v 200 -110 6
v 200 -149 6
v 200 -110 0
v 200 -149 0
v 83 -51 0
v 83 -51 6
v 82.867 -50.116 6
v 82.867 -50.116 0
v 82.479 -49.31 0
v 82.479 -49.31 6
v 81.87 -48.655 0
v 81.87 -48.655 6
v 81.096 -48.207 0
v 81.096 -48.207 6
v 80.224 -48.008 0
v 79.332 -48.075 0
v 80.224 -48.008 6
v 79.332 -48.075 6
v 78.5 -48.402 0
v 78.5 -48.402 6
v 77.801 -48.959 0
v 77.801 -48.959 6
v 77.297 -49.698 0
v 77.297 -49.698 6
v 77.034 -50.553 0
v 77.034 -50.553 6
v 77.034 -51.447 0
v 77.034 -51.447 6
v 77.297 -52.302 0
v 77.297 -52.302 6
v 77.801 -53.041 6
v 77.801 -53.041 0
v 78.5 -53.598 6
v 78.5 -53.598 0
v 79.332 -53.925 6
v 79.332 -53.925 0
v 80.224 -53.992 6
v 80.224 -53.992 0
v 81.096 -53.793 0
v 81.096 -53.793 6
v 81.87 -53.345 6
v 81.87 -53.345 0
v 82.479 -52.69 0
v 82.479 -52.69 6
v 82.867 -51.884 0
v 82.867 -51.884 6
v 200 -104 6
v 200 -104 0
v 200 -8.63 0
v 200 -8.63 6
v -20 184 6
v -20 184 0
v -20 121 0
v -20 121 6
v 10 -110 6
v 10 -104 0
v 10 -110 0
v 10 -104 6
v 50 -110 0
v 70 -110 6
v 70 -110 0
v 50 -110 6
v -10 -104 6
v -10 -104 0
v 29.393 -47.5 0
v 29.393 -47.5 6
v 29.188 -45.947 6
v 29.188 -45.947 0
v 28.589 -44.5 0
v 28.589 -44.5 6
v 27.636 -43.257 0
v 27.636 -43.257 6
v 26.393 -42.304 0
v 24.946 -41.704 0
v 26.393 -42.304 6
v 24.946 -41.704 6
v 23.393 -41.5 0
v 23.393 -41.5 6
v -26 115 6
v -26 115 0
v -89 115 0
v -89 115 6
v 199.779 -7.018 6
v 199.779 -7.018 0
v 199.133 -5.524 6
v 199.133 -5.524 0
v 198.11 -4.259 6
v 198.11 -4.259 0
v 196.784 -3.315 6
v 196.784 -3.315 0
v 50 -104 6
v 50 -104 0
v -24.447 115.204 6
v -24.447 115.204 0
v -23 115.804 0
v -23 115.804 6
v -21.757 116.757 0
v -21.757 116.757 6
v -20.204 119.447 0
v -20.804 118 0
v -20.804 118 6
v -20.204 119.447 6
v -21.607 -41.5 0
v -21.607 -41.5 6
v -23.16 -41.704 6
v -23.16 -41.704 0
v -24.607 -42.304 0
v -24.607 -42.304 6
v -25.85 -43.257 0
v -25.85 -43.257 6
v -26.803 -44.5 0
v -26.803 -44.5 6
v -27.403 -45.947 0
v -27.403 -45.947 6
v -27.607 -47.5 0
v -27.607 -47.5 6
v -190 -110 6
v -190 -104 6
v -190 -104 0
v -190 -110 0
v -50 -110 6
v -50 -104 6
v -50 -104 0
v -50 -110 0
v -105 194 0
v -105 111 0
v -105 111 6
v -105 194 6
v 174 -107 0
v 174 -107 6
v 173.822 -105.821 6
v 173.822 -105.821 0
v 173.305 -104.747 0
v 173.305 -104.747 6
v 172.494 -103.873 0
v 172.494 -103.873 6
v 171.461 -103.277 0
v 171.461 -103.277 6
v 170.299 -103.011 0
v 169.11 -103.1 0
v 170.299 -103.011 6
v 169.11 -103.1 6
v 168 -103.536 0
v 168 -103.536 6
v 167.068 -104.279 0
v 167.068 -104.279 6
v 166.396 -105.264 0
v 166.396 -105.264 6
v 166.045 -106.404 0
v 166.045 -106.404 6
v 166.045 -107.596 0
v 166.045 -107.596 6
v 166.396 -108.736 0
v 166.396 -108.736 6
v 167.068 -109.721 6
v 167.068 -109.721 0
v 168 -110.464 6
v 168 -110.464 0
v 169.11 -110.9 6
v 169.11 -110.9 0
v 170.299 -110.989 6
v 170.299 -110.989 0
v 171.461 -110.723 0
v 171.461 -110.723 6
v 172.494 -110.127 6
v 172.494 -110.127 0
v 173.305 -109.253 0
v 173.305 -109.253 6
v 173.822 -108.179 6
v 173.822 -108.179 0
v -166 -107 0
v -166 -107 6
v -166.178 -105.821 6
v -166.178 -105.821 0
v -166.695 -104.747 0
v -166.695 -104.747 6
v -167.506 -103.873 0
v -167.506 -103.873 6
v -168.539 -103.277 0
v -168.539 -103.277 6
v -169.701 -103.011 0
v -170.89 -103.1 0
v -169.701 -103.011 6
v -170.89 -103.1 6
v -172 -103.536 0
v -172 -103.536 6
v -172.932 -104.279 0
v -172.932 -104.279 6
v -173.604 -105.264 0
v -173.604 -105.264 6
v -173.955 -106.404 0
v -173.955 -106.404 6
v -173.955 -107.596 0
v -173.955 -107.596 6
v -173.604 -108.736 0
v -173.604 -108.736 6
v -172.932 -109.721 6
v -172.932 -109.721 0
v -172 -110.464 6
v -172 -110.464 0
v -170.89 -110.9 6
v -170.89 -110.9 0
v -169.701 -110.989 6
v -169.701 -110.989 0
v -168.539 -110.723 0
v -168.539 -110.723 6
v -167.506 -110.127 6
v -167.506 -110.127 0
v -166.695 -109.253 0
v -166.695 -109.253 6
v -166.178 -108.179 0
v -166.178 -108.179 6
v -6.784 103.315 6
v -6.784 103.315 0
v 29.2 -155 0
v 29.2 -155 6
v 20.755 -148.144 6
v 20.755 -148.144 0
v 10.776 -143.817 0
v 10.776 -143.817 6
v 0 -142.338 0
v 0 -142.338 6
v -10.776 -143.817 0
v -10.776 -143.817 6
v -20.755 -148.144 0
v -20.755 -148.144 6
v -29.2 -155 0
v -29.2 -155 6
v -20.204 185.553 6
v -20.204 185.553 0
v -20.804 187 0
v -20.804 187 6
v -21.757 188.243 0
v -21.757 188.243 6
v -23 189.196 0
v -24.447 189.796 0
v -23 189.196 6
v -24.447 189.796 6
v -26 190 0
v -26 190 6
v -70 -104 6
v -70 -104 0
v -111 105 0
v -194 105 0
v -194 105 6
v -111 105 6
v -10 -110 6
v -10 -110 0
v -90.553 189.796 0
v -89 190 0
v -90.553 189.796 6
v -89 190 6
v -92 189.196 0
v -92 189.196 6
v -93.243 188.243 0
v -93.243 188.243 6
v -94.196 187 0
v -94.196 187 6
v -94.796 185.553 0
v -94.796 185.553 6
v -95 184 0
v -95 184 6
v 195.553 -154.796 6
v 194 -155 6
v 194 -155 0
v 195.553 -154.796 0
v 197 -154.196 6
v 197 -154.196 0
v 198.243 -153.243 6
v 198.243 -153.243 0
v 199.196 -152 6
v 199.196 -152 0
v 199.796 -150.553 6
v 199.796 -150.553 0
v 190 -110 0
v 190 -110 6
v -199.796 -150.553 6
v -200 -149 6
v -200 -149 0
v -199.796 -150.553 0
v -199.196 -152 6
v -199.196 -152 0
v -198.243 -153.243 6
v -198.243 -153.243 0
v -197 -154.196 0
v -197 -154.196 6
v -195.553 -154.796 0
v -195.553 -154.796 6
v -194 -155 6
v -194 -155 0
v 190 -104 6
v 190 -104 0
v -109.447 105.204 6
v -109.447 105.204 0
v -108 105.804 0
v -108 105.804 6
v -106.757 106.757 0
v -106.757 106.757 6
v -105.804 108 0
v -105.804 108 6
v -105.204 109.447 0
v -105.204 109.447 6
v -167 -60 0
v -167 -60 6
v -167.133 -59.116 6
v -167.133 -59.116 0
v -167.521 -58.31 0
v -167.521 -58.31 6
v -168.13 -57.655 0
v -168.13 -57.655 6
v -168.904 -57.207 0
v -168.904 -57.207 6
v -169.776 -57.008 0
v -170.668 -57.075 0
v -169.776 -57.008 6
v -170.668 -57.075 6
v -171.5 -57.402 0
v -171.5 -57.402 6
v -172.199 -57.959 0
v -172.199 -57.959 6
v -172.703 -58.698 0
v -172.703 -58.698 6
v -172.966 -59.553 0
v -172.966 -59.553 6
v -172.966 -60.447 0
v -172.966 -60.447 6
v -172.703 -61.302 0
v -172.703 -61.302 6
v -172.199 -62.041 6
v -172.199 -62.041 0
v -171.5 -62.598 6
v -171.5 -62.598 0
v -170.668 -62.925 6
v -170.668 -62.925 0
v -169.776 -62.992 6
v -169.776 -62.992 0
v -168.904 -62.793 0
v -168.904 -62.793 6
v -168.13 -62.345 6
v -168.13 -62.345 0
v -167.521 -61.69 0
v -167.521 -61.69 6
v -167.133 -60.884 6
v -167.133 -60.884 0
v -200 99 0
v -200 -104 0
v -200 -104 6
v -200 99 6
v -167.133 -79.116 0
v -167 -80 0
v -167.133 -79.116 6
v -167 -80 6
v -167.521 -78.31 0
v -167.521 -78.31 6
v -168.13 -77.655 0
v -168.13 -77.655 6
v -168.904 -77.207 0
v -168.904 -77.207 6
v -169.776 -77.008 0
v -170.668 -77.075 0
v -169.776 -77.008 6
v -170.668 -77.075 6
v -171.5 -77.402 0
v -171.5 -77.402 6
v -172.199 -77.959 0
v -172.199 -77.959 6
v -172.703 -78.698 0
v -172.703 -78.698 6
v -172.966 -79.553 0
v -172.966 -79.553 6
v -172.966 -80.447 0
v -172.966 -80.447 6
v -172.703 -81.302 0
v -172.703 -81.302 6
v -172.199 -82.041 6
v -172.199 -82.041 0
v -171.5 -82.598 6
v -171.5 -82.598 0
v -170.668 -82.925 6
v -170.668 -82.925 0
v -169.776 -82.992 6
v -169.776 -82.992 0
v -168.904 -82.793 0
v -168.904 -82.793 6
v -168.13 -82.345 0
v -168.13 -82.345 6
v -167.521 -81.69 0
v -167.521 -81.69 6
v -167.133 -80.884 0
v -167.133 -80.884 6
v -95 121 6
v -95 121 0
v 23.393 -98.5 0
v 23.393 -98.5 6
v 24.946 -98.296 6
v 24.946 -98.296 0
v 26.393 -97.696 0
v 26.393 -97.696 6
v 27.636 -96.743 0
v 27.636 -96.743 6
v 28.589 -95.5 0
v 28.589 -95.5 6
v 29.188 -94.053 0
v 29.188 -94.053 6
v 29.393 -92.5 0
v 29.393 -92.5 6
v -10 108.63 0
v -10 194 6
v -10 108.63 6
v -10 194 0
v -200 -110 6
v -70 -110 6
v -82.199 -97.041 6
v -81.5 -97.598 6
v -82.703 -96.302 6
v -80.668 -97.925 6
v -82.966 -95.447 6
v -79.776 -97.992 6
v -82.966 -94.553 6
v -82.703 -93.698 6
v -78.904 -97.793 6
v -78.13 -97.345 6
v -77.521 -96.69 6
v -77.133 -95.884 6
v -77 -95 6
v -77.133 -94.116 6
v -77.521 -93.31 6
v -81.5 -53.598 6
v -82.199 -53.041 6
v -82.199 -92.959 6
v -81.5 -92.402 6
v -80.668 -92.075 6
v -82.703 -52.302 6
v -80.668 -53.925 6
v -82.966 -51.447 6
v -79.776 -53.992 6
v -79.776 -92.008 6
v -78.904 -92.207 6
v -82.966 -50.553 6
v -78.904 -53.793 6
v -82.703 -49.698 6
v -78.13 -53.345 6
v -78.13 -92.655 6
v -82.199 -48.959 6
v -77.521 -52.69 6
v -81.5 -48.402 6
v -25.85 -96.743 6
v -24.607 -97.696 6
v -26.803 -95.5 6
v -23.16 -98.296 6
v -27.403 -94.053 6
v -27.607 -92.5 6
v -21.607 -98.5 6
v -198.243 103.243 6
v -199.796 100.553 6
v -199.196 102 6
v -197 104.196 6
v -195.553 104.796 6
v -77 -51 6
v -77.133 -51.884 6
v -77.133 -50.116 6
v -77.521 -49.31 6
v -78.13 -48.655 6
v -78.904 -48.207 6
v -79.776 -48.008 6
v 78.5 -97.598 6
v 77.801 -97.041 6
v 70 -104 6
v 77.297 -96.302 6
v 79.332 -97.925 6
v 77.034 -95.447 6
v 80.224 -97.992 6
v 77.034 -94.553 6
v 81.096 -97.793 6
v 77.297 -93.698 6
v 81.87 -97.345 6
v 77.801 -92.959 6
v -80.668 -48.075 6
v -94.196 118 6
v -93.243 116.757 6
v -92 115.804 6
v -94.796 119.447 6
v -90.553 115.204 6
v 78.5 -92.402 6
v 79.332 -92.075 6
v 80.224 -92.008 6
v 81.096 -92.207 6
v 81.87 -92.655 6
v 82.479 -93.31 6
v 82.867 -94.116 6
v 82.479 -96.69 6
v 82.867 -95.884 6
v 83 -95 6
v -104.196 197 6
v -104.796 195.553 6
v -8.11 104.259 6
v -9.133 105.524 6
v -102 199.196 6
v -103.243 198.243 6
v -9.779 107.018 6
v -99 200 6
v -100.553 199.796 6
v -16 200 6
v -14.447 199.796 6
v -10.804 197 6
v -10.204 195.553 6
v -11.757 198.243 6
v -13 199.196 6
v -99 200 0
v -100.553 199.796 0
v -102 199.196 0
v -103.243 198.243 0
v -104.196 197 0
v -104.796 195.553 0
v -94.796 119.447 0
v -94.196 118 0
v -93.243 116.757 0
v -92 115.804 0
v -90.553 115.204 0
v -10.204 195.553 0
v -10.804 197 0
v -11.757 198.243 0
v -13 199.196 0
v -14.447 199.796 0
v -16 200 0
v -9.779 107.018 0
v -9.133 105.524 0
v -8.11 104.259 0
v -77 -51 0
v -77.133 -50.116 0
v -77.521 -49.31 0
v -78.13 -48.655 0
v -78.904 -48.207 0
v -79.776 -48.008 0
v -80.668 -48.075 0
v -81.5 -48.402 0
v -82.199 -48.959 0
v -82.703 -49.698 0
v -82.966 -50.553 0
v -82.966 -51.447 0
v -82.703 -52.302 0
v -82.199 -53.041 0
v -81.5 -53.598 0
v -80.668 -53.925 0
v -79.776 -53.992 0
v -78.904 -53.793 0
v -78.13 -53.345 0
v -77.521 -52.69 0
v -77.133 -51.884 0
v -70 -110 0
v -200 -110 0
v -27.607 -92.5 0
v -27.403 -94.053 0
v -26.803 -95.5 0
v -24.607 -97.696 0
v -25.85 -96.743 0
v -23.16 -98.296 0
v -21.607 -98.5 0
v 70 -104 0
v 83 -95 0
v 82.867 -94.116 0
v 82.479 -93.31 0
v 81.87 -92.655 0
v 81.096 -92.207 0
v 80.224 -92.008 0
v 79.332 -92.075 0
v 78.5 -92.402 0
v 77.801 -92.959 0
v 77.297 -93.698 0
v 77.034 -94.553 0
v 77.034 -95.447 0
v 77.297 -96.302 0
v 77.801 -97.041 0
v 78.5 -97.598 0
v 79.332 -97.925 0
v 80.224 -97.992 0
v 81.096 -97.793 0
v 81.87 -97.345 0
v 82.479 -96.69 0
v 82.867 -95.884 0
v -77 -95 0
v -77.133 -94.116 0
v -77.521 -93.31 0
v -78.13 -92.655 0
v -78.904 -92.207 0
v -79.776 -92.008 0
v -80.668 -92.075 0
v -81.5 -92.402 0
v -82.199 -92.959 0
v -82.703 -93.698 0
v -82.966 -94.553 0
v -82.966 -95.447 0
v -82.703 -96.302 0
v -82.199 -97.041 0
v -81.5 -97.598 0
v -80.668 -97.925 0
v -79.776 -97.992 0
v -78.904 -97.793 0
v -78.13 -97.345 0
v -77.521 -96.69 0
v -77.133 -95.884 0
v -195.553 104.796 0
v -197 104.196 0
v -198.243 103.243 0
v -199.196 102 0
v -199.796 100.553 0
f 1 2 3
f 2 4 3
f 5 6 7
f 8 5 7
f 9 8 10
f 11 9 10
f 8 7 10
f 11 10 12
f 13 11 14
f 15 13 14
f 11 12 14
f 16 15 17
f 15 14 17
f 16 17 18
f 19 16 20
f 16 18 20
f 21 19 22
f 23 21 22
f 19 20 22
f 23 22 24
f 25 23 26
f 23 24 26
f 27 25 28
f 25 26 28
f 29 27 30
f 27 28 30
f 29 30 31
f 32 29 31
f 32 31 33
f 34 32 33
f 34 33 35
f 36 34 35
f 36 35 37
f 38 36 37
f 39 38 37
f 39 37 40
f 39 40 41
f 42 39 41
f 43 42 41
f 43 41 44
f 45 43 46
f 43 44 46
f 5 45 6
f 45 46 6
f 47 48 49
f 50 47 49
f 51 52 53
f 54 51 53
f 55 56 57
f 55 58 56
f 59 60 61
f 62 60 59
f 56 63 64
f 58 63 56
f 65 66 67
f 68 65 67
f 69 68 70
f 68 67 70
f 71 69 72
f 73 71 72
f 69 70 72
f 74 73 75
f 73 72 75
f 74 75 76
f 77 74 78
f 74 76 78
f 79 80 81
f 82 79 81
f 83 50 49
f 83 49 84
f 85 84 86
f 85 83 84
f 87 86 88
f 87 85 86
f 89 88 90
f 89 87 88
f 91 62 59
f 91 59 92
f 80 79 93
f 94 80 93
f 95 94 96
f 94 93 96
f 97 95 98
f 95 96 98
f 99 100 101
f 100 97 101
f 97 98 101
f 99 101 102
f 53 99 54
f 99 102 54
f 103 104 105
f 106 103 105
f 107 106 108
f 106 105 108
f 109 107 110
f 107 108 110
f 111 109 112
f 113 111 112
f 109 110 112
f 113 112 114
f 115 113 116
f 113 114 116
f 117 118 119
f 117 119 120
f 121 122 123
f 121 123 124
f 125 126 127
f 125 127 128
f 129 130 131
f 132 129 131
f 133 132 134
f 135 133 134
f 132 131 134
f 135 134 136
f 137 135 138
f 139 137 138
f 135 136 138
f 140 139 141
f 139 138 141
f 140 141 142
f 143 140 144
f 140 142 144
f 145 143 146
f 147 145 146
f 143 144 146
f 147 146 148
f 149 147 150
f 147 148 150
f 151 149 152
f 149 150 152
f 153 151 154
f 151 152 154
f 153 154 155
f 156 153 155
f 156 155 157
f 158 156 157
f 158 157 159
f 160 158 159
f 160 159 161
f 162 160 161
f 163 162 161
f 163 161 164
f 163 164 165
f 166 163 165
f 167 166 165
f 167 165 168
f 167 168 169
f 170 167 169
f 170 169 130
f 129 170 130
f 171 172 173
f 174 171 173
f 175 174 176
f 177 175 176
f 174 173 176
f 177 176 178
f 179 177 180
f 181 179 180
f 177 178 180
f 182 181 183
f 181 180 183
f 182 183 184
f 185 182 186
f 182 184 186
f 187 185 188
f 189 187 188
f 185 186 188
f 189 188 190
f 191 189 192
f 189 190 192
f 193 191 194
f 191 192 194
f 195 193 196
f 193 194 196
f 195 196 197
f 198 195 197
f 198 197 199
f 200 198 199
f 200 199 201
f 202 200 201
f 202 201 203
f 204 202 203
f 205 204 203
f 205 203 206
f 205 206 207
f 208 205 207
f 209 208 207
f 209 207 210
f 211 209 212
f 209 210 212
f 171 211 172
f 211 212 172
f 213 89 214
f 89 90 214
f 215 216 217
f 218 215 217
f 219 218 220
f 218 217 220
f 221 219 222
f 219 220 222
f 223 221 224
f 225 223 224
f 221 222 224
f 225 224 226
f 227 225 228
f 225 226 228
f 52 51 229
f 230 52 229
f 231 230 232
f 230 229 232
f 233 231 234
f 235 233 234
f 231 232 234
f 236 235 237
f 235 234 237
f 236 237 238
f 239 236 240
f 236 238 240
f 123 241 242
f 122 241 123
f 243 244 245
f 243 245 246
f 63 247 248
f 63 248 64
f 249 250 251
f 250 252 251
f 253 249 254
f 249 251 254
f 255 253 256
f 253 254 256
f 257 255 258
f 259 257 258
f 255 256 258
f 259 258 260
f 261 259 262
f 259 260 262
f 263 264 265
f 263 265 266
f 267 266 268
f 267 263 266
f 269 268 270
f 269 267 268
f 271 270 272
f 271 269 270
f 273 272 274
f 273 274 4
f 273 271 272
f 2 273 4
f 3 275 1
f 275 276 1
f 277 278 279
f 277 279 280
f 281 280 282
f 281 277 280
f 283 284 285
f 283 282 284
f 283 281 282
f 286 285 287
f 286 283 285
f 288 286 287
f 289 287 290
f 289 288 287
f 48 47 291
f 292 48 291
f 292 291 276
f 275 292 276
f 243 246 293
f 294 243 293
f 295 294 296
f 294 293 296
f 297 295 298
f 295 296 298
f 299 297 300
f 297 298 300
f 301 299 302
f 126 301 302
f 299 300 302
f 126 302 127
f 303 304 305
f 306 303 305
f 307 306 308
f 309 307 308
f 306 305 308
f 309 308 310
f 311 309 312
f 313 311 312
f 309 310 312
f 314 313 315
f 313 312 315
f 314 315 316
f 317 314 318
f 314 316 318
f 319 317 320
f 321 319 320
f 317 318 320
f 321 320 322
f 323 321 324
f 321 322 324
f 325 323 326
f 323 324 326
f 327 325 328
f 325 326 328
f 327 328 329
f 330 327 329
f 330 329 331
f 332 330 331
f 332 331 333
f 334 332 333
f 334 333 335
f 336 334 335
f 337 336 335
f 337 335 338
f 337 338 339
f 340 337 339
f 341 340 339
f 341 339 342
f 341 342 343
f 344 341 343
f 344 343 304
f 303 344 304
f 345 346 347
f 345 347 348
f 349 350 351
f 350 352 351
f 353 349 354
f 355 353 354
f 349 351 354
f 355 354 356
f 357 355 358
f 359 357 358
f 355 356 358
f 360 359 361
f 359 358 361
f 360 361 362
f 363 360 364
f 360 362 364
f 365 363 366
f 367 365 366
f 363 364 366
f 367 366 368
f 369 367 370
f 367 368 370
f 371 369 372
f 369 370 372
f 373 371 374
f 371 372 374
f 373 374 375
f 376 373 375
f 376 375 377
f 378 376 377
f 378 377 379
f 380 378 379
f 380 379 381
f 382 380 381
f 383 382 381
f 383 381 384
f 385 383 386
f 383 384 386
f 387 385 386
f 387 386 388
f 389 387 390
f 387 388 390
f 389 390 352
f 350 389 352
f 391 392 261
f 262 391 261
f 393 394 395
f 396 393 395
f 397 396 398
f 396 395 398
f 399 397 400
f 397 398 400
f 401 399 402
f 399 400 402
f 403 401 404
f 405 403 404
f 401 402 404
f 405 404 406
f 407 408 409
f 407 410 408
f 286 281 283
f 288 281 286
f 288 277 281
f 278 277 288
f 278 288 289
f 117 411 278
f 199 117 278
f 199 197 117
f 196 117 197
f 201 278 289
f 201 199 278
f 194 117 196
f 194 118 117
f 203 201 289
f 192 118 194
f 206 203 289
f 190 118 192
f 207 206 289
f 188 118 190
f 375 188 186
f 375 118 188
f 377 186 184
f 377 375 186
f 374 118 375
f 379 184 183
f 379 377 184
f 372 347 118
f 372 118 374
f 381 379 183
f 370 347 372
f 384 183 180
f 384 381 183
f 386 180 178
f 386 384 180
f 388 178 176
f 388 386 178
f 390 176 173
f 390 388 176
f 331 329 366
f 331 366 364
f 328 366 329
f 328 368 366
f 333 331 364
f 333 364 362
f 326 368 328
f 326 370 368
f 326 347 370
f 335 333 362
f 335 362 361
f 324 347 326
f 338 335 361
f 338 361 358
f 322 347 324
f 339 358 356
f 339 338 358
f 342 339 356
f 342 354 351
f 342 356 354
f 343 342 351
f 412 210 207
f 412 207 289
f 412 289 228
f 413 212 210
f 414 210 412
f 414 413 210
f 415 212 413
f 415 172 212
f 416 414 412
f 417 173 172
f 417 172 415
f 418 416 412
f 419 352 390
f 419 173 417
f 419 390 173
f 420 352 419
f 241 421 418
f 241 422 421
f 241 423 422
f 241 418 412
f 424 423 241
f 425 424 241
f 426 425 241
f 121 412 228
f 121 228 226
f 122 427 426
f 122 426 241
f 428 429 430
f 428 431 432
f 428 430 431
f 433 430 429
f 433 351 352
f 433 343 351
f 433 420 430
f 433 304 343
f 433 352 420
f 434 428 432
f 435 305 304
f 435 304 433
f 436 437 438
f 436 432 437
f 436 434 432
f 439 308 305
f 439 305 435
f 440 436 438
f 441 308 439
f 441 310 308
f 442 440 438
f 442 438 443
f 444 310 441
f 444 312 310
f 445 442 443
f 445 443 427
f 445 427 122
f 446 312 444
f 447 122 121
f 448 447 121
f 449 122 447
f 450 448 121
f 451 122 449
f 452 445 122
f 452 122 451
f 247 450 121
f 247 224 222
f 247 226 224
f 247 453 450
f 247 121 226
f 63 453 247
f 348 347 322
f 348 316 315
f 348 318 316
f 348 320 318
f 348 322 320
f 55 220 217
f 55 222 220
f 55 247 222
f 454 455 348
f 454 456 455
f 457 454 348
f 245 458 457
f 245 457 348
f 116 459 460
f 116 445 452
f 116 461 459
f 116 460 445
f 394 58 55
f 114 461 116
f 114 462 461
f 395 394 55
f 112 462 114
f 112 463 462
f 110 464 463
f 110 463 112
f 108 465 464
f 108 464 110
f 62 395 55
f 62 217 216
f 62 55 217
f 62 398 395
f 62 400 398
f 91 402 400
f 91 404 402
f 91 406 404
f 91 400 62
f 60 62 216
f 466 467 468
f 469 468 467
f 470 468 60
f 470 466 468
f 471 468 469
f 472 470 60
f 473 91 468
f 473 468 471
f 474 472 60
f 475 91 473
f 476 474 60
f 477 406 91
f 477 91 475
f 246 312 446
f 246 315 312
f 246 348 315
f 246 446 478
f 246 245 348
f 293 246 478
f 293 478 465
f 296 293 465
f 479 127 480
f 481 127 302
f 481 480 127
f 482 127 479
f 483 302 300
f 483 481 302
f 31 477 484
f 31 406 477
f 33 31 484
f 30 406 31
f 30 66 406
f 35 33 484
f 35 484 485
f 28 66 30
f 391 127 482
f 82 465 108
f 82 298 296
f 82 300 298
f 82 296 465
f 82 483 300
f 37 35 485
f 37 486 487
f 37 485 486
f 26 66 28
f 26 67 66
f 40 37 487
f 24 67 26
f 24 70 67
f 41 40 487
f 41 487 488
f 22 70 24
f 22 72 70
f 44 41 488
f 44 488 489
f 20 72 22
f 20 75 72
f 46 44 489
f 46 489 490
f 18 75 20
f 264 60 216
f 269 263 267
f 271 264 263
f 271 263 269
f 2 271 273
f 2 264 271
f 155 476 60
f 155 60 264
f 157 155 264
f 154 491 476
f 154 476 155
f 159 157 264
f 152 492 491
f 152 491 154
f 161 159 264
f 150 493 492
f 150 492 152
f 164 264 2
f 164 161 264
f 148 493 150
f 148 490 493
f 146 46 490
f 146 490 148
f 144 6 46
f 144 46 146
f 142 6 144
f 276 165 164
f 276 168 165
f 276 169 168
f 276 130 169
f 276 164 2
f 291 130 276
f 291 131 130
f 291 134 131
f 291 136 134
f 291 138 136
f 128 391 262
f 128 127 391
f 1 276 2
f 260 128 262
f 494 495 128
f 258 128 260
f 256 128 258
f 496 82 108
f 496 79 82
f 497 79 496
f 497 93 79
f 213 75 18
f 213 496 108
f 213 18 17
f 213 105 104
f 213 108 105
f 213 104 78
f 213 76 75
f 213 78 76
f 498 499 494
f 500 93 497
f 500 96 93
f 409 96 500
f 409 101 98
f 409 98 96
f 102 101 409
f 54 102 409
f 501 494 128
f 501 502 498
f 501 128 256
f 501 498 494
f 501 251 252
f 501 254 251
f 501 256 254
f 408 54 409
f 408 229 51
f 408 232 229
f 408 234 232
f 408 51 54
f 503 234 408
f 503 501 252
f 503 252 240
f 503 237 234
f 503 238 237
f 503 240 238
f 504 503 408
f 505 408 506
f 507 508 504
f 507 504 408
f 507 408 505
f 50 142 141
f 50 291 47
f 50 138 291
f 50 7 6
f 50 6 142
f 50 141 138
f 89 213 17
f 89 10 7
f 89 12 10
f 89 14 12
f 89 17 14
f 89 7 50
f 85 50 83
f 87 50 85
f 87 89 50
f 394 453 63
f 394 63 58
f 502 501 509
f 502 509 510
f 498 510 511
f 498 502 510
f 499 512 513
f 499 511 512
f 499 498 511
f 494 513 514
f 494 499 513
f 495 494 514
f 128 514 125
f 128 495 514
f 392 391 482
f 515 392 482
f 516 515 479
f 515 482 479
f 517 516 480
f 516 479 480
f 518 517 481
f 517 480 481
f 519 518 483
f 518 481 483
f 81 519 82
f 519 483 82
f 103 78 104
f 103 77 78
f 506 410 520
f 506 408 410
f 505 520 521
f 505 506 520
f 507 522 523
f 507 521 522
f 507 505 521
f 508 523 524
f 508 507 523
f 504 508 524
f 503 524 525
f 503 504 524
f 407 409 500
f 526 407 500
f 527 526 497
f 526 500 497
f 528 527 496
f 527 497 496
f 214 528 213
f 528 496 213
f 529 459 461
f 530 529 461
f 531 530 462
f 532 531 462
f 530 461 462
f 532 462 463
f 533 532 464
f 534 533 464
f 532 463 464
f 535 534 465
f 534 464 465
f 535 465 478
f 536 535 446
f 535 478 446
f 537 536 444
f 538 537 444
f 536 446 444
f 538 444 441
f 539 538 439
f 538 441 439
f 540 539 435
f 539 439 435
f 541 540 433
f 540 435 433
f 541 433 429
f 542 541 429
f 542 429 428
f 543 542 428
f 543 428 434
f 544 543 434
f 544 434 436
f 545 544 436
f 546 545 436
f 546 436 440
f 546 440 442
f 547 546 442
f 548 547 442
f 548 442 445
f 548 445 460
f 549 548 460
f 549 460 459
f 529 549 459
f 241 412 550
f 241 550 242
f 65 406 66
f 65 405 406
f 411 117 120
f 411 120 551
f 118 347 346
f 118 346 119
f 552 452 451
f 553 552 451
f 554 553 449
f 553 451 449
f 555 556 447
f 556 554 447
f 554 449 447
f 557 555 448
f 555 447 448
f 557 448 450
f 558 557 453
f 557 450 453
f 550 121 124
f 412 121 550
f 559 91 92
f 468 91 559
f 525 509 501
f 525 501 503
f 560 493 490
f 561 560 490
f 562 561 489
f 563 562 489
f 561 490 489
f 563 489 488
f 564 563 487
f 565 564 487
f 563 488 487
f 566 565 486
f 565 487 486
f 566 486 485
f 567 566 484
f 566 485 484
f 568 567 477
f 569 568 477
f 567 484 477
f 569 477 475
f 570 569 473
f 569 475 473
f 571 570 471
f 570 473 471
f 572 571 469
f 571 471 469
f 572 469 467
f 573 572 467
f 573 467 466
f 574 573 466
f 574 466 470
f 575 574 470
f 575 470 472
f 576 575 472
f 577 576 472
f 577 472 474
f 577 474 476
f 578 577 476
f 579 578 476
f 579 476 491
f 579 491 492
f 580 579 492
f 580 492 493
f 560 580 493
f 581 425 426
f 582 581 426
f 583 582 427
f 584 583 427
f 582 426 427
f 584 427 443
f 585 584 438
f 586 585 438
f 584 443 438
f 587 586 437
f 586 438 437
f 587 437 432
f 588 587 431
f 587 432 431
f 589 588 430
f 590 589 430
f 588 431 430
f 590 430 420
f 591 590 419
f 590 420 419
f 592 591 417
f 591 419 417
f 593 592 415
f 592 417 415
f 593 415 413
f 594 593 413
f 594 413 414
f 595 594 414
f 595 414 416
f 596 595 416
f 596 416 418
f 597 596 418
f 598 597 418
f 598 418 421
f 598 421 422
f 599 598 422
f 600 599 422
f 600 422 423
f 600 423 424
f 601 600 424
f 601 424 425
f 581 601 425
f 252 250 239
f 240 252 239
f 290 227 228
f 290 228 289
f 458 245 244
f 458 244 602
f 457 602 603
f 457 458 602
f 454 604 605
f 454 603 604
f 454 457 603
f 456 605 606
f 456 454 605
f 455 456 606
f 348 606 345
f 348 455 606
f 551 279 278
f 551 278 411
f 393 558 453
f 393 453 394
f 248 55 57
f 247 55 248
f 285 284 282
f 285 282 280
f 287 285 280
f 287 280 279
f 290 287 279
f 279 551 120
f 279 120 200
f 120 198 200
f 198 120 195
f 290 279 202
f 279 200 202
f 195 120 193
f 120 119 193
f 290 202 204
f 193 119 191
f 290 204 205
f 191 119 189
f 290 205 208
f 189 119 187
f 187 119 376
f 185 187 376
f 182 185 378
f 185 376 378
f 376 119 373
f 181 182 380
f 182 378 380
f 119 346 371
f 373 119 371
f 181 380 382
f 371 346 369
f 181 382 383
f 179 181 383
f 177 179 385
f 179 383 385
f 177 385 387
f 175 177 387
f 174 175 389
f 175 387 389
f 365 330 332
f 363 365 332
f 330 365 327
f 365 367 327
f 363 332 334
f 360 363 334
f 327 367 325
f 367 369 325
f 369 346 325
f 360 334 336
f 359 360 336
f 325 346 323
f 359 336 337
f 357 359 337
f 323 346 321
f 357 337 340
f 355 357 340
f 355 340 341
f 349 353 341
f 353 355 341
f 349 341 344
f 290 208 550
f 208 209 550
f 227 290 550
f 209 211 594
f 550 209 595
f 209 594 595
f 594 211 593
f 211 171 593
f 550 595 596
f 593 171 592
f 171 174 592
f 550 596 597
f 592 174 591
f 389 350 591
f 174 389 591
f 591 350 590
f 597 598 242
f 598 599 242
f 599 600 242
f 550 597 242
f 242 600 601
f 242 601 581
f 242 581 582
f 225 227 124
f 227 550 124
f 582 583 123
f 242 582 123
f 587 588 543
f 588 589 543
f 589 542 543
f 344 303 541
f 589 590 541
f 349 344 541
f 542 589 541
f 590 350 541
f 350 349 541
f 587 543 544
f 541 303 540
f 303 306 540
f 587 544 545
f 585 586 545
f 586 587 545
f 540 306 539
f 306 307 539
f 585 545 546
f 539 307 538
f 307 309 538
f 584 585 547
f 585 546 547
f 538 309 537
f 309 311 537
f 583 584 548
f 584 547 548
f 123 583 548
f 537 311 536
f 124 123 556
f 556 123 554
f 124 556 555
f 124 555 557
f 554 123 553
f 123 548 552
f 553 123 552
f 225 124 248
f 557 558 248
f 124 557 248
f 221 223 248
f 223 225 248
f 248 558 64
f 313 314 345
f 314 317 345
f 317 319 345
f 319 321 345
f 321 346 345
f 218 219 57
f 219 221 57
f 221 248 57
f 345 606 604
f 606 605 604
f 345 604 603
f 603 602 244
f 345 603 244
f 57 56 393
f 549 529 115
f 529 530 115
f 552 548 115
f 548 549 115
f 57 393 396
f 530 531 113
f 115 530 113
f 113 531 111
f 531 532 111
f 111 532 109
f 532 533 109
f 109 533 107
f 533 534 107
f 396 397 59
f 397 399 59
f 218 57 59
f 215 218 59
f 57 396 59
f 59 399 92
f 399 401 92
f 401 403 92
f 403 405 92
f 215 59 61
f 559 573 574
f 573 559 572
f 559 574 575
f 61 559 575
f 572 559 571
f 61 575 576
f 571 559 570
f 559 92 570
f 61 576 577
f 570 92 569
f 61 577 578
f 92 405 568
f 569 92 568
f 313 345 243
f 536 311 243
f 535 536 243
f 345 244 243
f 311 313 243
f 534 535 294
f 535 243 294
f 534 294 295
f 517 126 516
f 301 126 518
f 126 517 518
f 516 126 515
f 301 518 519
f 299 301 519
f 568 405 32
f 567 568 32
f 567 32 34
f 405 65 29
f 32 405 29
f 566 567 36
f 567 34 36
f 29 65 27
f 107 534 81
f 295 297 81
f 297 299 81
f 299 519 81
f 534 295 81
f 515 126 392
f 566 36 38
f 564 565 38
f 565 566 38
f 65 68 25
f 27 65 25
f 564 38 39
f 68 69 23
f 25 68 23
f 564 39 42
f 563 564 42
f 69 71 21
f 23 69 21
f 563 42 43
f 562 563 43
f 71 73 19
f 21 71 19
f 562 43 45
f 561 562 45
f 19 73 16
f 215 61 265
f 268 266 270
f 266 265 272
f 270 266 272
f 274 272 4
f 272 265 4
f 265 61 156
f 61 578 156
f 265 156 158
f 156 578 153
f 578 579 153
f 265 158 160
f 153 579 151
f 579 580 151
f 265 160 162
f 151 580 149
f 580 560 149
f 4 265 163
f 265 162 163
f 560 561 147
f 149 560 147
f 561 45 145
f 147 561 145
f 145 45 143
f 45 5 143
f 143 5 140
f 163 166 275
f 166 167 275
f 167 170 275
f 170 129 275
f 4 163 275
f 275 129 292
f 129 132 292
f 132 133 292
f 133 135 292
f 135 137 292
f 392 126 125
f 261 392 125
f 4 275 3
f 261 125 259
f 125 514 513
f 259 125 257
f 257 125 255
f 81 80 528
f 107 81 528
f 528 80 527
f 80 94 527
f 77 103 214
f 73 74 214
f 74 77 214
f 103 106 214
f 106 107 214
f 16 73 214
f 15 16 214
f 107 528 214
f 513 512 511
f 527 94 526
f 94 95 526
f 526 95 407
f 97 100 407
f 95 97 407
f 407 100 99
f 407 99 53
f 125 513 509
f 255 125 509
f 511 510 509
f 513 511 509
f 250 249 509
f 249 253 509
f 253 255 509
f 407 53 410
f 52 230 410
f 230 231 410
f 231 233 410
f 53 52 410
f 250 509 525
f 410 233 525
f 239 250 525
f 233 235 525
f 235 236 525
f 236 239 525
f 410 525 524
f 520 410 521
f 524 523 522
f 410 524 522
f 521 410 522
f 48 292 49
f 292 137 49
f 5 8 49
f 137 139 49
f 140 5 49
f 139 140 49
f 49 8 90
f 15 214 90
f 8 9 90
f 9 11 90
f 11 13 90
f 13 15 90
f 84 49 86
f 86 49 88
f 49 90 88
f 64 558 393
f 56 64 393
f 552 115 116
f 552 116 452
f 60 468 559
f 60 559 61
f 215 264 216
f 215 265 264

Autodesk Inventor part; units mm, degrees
ref_plane "YZ Plane" through (0, 0, 0) normal (1, 0, 0) x (0, 1, 0)
ref_plane "XZ Plane" through (0, 0, 0) normal (0, 1, 0) x (-1, 0, 0)
ref_plane "XY Plane" through (0, 0, 0) normal (0, 0, 1) x (1, 0, 0)
sketch "Boceto1" plane through (0, 0, 0) normal (0, 0, 1) x (1, 0, 0)
  line L0 (200, -155) -> (-200, -155)
  line L1 (-200, -155) -> (-200, 105)
  line L2 (-200, 105) -> (-105, 105)
  line L3 (-105, 105) -> (-105, 200)
  line L4 (-105, 200) -> (-10, 200)
  line L5 (-10, 200) -> (-10, 105)
  line L6 (200, -155) -> (200, -5)
  line L7 (200, -5) -> (-10, 105)
  line L8 (-27.6071, -98.5) -> (29.3929, -98.5)
  line L9 (29.3929, -98.5) -> (29.3929, -41.5)
  line L10 (29.3929, -41.5) -> (-27.6071, -41.5)
  line L11 (-27.6071, -41.5) -> (-27.6071, -98.5)
  line L12 (-27.6071, -98.5) -> (29.3929, -41.5) construction
  line L13 (29.3929, -98.5) -> (-27.6071, -41.5) construction
  line L14 (-20, 115) -> (-95, 115)
  line L15 (-95, 115) -> (-95, 190)
  line L16 (-95, 190) -> (-20, 190)
  line L17 (-20, 190) -> (-20, 115)
  line L18 (-20, 115) -> (-95, 190) construction
  line L19 (-95, 115) -> (-20, 190) construction
  point P0 (0.8929, -70)
  point P1 (-57.5, 152.5)
  dimension "d2" = 260
  dimension "d3" = 95
  dimension "d4" = 95
  dimension "d5" = 150
  dimension "d6" = 400
  dimension "d7" = 57
  dimension "d8" = 57
  dimension "d10" = 75
  dimension "d11" = 75
extrude "Extrusión1" add sketch "Boceto1" along normal blind 6
fillet "Empalme1" radius 6 16 edges at (-10, 105, 3) (-10, 200, 3) (200, -5, 3) (200, -155, 3) (-200, -155, 3) (-200, 105, 3) (-105, 105, 3) (-105, 200, 3) (-95, 190, 3) (-20, 190, 3) (-20, 115, 3) (-95, 115, 3) (-27.6071, -41.5, 3) (29.3929, -41.5, 3) (29.3929, -98.5, 3) (-27.6071, -98.5, 3)
sketch "Boceto2" plane through (0, 0, 6) normal (0, 0, 1) x (1, 0, 0)
  line L0 (10, -110) -> (-10, -110)
  line L1 (-10, -110) -> (-10, -104)
  line L2 (-10, -104) -> (10, -104)
  line L3 (10, -104) -> (10, -110)
  line L4 (10, -110) -> (-10, -104) construction
  line L5 (-10, -110) -> (10, -104) construction
  line L6 (-194, -155) -> (194, -155) projected
  line L7 (-50, -110) -> (-70, -110)
  line L8 (-70, -110) -> (-70, -104)
  line L9 (-70, -104) -> (-50, -104)
  line L10 (-50, -104) -> (-50, -110)
  line L11 (-50, -110) -> (-70, -104) construction
  line L12 (-70, -110) -> (-50, -104) construction
  line L13 (70, -110) -> (50, -110)
  line L14 (50, -110) -> (50, -104)
  line L15 (50, -104) -> (70, -104)
  line L16 (70, -104) -> (70, -110)
  line L17 (70, -110) -> (50, -104) construction
  line L18 (50, -110) -> (70, -104) construction
  circle A0 centre (-170, -107) radius 4
  line L19 (-190, -110) -> (-210, -110)
  line L20 (-210, -110) -> (-210, -104)
  line L21 (-210, -104) -> (-190, -104)
  line L22 (-190, -104) -> (-190, -110)
  line L23 (-200, -149) -> (-200, 99) projected
  line L24 (-190, -110) -> (-210, -104) construction
  line L25 (-210, -110) -> (-190, -104) construction
  circle A1 centre (-80, -95) radius 3
  circle A2 centre (-80, -51) radius 3
  circle A3 centre (-170, -80) radius 3
  circle A4 centre (-170, -60) radius 3
  line L26 (0, 0) -> (0, -107)
  circle A5 centre (170, -107) radius 4
  line L27 (190, -110) -> (210, -110)
  line L28 (210, -110) -> (210, -104)
  line L29 (210, -104) -> (190, -104)
  line L30 (190, -104) -> (190, -110)
  circle A6 centre (80, -95) radius 3
  circle A7 centre (80, -51) radius 3
  line L31 (194, -155) -> (-194, -155) projected
  arc A8 (29.2, -155) -> (-29.2, -155) centre (0, -182.3379) ccw
  line L32 (-29.2, -155) -> (29.2, -155)
  point P0 (-60, -107)
  point P1 (60, -107)
  point P2 (-200, -107)
  dimension "d15" = 20
  dimension "d16" = 6
  dimension "d17" = 48
  dimension "d18" = 20
  dimension "d19" = 60
  dimension "d20" = 20
  dimension "d21" = 60
  dimension "d22" = 8
  dimension "d23" = 20
  dimension "d24" = 6
  dimension "d25" = 110
  dimension "d26" = 6
  dimension "d27" = 20
  dimension "d28" = 12
  dimension "d29" = 6
  dimension "d30" = 44
  dimension "d31" = 6
  dimension "d32" = 6
  dimension "d33" = 40
  dimension "d36" = 6
  dimension "d37" = 6
extrude "Extrusión2" cut sketch "Boceto2" against normal through all
properties part number "EXTERNAL SIDE PLATE" material "Acero, carbono"
